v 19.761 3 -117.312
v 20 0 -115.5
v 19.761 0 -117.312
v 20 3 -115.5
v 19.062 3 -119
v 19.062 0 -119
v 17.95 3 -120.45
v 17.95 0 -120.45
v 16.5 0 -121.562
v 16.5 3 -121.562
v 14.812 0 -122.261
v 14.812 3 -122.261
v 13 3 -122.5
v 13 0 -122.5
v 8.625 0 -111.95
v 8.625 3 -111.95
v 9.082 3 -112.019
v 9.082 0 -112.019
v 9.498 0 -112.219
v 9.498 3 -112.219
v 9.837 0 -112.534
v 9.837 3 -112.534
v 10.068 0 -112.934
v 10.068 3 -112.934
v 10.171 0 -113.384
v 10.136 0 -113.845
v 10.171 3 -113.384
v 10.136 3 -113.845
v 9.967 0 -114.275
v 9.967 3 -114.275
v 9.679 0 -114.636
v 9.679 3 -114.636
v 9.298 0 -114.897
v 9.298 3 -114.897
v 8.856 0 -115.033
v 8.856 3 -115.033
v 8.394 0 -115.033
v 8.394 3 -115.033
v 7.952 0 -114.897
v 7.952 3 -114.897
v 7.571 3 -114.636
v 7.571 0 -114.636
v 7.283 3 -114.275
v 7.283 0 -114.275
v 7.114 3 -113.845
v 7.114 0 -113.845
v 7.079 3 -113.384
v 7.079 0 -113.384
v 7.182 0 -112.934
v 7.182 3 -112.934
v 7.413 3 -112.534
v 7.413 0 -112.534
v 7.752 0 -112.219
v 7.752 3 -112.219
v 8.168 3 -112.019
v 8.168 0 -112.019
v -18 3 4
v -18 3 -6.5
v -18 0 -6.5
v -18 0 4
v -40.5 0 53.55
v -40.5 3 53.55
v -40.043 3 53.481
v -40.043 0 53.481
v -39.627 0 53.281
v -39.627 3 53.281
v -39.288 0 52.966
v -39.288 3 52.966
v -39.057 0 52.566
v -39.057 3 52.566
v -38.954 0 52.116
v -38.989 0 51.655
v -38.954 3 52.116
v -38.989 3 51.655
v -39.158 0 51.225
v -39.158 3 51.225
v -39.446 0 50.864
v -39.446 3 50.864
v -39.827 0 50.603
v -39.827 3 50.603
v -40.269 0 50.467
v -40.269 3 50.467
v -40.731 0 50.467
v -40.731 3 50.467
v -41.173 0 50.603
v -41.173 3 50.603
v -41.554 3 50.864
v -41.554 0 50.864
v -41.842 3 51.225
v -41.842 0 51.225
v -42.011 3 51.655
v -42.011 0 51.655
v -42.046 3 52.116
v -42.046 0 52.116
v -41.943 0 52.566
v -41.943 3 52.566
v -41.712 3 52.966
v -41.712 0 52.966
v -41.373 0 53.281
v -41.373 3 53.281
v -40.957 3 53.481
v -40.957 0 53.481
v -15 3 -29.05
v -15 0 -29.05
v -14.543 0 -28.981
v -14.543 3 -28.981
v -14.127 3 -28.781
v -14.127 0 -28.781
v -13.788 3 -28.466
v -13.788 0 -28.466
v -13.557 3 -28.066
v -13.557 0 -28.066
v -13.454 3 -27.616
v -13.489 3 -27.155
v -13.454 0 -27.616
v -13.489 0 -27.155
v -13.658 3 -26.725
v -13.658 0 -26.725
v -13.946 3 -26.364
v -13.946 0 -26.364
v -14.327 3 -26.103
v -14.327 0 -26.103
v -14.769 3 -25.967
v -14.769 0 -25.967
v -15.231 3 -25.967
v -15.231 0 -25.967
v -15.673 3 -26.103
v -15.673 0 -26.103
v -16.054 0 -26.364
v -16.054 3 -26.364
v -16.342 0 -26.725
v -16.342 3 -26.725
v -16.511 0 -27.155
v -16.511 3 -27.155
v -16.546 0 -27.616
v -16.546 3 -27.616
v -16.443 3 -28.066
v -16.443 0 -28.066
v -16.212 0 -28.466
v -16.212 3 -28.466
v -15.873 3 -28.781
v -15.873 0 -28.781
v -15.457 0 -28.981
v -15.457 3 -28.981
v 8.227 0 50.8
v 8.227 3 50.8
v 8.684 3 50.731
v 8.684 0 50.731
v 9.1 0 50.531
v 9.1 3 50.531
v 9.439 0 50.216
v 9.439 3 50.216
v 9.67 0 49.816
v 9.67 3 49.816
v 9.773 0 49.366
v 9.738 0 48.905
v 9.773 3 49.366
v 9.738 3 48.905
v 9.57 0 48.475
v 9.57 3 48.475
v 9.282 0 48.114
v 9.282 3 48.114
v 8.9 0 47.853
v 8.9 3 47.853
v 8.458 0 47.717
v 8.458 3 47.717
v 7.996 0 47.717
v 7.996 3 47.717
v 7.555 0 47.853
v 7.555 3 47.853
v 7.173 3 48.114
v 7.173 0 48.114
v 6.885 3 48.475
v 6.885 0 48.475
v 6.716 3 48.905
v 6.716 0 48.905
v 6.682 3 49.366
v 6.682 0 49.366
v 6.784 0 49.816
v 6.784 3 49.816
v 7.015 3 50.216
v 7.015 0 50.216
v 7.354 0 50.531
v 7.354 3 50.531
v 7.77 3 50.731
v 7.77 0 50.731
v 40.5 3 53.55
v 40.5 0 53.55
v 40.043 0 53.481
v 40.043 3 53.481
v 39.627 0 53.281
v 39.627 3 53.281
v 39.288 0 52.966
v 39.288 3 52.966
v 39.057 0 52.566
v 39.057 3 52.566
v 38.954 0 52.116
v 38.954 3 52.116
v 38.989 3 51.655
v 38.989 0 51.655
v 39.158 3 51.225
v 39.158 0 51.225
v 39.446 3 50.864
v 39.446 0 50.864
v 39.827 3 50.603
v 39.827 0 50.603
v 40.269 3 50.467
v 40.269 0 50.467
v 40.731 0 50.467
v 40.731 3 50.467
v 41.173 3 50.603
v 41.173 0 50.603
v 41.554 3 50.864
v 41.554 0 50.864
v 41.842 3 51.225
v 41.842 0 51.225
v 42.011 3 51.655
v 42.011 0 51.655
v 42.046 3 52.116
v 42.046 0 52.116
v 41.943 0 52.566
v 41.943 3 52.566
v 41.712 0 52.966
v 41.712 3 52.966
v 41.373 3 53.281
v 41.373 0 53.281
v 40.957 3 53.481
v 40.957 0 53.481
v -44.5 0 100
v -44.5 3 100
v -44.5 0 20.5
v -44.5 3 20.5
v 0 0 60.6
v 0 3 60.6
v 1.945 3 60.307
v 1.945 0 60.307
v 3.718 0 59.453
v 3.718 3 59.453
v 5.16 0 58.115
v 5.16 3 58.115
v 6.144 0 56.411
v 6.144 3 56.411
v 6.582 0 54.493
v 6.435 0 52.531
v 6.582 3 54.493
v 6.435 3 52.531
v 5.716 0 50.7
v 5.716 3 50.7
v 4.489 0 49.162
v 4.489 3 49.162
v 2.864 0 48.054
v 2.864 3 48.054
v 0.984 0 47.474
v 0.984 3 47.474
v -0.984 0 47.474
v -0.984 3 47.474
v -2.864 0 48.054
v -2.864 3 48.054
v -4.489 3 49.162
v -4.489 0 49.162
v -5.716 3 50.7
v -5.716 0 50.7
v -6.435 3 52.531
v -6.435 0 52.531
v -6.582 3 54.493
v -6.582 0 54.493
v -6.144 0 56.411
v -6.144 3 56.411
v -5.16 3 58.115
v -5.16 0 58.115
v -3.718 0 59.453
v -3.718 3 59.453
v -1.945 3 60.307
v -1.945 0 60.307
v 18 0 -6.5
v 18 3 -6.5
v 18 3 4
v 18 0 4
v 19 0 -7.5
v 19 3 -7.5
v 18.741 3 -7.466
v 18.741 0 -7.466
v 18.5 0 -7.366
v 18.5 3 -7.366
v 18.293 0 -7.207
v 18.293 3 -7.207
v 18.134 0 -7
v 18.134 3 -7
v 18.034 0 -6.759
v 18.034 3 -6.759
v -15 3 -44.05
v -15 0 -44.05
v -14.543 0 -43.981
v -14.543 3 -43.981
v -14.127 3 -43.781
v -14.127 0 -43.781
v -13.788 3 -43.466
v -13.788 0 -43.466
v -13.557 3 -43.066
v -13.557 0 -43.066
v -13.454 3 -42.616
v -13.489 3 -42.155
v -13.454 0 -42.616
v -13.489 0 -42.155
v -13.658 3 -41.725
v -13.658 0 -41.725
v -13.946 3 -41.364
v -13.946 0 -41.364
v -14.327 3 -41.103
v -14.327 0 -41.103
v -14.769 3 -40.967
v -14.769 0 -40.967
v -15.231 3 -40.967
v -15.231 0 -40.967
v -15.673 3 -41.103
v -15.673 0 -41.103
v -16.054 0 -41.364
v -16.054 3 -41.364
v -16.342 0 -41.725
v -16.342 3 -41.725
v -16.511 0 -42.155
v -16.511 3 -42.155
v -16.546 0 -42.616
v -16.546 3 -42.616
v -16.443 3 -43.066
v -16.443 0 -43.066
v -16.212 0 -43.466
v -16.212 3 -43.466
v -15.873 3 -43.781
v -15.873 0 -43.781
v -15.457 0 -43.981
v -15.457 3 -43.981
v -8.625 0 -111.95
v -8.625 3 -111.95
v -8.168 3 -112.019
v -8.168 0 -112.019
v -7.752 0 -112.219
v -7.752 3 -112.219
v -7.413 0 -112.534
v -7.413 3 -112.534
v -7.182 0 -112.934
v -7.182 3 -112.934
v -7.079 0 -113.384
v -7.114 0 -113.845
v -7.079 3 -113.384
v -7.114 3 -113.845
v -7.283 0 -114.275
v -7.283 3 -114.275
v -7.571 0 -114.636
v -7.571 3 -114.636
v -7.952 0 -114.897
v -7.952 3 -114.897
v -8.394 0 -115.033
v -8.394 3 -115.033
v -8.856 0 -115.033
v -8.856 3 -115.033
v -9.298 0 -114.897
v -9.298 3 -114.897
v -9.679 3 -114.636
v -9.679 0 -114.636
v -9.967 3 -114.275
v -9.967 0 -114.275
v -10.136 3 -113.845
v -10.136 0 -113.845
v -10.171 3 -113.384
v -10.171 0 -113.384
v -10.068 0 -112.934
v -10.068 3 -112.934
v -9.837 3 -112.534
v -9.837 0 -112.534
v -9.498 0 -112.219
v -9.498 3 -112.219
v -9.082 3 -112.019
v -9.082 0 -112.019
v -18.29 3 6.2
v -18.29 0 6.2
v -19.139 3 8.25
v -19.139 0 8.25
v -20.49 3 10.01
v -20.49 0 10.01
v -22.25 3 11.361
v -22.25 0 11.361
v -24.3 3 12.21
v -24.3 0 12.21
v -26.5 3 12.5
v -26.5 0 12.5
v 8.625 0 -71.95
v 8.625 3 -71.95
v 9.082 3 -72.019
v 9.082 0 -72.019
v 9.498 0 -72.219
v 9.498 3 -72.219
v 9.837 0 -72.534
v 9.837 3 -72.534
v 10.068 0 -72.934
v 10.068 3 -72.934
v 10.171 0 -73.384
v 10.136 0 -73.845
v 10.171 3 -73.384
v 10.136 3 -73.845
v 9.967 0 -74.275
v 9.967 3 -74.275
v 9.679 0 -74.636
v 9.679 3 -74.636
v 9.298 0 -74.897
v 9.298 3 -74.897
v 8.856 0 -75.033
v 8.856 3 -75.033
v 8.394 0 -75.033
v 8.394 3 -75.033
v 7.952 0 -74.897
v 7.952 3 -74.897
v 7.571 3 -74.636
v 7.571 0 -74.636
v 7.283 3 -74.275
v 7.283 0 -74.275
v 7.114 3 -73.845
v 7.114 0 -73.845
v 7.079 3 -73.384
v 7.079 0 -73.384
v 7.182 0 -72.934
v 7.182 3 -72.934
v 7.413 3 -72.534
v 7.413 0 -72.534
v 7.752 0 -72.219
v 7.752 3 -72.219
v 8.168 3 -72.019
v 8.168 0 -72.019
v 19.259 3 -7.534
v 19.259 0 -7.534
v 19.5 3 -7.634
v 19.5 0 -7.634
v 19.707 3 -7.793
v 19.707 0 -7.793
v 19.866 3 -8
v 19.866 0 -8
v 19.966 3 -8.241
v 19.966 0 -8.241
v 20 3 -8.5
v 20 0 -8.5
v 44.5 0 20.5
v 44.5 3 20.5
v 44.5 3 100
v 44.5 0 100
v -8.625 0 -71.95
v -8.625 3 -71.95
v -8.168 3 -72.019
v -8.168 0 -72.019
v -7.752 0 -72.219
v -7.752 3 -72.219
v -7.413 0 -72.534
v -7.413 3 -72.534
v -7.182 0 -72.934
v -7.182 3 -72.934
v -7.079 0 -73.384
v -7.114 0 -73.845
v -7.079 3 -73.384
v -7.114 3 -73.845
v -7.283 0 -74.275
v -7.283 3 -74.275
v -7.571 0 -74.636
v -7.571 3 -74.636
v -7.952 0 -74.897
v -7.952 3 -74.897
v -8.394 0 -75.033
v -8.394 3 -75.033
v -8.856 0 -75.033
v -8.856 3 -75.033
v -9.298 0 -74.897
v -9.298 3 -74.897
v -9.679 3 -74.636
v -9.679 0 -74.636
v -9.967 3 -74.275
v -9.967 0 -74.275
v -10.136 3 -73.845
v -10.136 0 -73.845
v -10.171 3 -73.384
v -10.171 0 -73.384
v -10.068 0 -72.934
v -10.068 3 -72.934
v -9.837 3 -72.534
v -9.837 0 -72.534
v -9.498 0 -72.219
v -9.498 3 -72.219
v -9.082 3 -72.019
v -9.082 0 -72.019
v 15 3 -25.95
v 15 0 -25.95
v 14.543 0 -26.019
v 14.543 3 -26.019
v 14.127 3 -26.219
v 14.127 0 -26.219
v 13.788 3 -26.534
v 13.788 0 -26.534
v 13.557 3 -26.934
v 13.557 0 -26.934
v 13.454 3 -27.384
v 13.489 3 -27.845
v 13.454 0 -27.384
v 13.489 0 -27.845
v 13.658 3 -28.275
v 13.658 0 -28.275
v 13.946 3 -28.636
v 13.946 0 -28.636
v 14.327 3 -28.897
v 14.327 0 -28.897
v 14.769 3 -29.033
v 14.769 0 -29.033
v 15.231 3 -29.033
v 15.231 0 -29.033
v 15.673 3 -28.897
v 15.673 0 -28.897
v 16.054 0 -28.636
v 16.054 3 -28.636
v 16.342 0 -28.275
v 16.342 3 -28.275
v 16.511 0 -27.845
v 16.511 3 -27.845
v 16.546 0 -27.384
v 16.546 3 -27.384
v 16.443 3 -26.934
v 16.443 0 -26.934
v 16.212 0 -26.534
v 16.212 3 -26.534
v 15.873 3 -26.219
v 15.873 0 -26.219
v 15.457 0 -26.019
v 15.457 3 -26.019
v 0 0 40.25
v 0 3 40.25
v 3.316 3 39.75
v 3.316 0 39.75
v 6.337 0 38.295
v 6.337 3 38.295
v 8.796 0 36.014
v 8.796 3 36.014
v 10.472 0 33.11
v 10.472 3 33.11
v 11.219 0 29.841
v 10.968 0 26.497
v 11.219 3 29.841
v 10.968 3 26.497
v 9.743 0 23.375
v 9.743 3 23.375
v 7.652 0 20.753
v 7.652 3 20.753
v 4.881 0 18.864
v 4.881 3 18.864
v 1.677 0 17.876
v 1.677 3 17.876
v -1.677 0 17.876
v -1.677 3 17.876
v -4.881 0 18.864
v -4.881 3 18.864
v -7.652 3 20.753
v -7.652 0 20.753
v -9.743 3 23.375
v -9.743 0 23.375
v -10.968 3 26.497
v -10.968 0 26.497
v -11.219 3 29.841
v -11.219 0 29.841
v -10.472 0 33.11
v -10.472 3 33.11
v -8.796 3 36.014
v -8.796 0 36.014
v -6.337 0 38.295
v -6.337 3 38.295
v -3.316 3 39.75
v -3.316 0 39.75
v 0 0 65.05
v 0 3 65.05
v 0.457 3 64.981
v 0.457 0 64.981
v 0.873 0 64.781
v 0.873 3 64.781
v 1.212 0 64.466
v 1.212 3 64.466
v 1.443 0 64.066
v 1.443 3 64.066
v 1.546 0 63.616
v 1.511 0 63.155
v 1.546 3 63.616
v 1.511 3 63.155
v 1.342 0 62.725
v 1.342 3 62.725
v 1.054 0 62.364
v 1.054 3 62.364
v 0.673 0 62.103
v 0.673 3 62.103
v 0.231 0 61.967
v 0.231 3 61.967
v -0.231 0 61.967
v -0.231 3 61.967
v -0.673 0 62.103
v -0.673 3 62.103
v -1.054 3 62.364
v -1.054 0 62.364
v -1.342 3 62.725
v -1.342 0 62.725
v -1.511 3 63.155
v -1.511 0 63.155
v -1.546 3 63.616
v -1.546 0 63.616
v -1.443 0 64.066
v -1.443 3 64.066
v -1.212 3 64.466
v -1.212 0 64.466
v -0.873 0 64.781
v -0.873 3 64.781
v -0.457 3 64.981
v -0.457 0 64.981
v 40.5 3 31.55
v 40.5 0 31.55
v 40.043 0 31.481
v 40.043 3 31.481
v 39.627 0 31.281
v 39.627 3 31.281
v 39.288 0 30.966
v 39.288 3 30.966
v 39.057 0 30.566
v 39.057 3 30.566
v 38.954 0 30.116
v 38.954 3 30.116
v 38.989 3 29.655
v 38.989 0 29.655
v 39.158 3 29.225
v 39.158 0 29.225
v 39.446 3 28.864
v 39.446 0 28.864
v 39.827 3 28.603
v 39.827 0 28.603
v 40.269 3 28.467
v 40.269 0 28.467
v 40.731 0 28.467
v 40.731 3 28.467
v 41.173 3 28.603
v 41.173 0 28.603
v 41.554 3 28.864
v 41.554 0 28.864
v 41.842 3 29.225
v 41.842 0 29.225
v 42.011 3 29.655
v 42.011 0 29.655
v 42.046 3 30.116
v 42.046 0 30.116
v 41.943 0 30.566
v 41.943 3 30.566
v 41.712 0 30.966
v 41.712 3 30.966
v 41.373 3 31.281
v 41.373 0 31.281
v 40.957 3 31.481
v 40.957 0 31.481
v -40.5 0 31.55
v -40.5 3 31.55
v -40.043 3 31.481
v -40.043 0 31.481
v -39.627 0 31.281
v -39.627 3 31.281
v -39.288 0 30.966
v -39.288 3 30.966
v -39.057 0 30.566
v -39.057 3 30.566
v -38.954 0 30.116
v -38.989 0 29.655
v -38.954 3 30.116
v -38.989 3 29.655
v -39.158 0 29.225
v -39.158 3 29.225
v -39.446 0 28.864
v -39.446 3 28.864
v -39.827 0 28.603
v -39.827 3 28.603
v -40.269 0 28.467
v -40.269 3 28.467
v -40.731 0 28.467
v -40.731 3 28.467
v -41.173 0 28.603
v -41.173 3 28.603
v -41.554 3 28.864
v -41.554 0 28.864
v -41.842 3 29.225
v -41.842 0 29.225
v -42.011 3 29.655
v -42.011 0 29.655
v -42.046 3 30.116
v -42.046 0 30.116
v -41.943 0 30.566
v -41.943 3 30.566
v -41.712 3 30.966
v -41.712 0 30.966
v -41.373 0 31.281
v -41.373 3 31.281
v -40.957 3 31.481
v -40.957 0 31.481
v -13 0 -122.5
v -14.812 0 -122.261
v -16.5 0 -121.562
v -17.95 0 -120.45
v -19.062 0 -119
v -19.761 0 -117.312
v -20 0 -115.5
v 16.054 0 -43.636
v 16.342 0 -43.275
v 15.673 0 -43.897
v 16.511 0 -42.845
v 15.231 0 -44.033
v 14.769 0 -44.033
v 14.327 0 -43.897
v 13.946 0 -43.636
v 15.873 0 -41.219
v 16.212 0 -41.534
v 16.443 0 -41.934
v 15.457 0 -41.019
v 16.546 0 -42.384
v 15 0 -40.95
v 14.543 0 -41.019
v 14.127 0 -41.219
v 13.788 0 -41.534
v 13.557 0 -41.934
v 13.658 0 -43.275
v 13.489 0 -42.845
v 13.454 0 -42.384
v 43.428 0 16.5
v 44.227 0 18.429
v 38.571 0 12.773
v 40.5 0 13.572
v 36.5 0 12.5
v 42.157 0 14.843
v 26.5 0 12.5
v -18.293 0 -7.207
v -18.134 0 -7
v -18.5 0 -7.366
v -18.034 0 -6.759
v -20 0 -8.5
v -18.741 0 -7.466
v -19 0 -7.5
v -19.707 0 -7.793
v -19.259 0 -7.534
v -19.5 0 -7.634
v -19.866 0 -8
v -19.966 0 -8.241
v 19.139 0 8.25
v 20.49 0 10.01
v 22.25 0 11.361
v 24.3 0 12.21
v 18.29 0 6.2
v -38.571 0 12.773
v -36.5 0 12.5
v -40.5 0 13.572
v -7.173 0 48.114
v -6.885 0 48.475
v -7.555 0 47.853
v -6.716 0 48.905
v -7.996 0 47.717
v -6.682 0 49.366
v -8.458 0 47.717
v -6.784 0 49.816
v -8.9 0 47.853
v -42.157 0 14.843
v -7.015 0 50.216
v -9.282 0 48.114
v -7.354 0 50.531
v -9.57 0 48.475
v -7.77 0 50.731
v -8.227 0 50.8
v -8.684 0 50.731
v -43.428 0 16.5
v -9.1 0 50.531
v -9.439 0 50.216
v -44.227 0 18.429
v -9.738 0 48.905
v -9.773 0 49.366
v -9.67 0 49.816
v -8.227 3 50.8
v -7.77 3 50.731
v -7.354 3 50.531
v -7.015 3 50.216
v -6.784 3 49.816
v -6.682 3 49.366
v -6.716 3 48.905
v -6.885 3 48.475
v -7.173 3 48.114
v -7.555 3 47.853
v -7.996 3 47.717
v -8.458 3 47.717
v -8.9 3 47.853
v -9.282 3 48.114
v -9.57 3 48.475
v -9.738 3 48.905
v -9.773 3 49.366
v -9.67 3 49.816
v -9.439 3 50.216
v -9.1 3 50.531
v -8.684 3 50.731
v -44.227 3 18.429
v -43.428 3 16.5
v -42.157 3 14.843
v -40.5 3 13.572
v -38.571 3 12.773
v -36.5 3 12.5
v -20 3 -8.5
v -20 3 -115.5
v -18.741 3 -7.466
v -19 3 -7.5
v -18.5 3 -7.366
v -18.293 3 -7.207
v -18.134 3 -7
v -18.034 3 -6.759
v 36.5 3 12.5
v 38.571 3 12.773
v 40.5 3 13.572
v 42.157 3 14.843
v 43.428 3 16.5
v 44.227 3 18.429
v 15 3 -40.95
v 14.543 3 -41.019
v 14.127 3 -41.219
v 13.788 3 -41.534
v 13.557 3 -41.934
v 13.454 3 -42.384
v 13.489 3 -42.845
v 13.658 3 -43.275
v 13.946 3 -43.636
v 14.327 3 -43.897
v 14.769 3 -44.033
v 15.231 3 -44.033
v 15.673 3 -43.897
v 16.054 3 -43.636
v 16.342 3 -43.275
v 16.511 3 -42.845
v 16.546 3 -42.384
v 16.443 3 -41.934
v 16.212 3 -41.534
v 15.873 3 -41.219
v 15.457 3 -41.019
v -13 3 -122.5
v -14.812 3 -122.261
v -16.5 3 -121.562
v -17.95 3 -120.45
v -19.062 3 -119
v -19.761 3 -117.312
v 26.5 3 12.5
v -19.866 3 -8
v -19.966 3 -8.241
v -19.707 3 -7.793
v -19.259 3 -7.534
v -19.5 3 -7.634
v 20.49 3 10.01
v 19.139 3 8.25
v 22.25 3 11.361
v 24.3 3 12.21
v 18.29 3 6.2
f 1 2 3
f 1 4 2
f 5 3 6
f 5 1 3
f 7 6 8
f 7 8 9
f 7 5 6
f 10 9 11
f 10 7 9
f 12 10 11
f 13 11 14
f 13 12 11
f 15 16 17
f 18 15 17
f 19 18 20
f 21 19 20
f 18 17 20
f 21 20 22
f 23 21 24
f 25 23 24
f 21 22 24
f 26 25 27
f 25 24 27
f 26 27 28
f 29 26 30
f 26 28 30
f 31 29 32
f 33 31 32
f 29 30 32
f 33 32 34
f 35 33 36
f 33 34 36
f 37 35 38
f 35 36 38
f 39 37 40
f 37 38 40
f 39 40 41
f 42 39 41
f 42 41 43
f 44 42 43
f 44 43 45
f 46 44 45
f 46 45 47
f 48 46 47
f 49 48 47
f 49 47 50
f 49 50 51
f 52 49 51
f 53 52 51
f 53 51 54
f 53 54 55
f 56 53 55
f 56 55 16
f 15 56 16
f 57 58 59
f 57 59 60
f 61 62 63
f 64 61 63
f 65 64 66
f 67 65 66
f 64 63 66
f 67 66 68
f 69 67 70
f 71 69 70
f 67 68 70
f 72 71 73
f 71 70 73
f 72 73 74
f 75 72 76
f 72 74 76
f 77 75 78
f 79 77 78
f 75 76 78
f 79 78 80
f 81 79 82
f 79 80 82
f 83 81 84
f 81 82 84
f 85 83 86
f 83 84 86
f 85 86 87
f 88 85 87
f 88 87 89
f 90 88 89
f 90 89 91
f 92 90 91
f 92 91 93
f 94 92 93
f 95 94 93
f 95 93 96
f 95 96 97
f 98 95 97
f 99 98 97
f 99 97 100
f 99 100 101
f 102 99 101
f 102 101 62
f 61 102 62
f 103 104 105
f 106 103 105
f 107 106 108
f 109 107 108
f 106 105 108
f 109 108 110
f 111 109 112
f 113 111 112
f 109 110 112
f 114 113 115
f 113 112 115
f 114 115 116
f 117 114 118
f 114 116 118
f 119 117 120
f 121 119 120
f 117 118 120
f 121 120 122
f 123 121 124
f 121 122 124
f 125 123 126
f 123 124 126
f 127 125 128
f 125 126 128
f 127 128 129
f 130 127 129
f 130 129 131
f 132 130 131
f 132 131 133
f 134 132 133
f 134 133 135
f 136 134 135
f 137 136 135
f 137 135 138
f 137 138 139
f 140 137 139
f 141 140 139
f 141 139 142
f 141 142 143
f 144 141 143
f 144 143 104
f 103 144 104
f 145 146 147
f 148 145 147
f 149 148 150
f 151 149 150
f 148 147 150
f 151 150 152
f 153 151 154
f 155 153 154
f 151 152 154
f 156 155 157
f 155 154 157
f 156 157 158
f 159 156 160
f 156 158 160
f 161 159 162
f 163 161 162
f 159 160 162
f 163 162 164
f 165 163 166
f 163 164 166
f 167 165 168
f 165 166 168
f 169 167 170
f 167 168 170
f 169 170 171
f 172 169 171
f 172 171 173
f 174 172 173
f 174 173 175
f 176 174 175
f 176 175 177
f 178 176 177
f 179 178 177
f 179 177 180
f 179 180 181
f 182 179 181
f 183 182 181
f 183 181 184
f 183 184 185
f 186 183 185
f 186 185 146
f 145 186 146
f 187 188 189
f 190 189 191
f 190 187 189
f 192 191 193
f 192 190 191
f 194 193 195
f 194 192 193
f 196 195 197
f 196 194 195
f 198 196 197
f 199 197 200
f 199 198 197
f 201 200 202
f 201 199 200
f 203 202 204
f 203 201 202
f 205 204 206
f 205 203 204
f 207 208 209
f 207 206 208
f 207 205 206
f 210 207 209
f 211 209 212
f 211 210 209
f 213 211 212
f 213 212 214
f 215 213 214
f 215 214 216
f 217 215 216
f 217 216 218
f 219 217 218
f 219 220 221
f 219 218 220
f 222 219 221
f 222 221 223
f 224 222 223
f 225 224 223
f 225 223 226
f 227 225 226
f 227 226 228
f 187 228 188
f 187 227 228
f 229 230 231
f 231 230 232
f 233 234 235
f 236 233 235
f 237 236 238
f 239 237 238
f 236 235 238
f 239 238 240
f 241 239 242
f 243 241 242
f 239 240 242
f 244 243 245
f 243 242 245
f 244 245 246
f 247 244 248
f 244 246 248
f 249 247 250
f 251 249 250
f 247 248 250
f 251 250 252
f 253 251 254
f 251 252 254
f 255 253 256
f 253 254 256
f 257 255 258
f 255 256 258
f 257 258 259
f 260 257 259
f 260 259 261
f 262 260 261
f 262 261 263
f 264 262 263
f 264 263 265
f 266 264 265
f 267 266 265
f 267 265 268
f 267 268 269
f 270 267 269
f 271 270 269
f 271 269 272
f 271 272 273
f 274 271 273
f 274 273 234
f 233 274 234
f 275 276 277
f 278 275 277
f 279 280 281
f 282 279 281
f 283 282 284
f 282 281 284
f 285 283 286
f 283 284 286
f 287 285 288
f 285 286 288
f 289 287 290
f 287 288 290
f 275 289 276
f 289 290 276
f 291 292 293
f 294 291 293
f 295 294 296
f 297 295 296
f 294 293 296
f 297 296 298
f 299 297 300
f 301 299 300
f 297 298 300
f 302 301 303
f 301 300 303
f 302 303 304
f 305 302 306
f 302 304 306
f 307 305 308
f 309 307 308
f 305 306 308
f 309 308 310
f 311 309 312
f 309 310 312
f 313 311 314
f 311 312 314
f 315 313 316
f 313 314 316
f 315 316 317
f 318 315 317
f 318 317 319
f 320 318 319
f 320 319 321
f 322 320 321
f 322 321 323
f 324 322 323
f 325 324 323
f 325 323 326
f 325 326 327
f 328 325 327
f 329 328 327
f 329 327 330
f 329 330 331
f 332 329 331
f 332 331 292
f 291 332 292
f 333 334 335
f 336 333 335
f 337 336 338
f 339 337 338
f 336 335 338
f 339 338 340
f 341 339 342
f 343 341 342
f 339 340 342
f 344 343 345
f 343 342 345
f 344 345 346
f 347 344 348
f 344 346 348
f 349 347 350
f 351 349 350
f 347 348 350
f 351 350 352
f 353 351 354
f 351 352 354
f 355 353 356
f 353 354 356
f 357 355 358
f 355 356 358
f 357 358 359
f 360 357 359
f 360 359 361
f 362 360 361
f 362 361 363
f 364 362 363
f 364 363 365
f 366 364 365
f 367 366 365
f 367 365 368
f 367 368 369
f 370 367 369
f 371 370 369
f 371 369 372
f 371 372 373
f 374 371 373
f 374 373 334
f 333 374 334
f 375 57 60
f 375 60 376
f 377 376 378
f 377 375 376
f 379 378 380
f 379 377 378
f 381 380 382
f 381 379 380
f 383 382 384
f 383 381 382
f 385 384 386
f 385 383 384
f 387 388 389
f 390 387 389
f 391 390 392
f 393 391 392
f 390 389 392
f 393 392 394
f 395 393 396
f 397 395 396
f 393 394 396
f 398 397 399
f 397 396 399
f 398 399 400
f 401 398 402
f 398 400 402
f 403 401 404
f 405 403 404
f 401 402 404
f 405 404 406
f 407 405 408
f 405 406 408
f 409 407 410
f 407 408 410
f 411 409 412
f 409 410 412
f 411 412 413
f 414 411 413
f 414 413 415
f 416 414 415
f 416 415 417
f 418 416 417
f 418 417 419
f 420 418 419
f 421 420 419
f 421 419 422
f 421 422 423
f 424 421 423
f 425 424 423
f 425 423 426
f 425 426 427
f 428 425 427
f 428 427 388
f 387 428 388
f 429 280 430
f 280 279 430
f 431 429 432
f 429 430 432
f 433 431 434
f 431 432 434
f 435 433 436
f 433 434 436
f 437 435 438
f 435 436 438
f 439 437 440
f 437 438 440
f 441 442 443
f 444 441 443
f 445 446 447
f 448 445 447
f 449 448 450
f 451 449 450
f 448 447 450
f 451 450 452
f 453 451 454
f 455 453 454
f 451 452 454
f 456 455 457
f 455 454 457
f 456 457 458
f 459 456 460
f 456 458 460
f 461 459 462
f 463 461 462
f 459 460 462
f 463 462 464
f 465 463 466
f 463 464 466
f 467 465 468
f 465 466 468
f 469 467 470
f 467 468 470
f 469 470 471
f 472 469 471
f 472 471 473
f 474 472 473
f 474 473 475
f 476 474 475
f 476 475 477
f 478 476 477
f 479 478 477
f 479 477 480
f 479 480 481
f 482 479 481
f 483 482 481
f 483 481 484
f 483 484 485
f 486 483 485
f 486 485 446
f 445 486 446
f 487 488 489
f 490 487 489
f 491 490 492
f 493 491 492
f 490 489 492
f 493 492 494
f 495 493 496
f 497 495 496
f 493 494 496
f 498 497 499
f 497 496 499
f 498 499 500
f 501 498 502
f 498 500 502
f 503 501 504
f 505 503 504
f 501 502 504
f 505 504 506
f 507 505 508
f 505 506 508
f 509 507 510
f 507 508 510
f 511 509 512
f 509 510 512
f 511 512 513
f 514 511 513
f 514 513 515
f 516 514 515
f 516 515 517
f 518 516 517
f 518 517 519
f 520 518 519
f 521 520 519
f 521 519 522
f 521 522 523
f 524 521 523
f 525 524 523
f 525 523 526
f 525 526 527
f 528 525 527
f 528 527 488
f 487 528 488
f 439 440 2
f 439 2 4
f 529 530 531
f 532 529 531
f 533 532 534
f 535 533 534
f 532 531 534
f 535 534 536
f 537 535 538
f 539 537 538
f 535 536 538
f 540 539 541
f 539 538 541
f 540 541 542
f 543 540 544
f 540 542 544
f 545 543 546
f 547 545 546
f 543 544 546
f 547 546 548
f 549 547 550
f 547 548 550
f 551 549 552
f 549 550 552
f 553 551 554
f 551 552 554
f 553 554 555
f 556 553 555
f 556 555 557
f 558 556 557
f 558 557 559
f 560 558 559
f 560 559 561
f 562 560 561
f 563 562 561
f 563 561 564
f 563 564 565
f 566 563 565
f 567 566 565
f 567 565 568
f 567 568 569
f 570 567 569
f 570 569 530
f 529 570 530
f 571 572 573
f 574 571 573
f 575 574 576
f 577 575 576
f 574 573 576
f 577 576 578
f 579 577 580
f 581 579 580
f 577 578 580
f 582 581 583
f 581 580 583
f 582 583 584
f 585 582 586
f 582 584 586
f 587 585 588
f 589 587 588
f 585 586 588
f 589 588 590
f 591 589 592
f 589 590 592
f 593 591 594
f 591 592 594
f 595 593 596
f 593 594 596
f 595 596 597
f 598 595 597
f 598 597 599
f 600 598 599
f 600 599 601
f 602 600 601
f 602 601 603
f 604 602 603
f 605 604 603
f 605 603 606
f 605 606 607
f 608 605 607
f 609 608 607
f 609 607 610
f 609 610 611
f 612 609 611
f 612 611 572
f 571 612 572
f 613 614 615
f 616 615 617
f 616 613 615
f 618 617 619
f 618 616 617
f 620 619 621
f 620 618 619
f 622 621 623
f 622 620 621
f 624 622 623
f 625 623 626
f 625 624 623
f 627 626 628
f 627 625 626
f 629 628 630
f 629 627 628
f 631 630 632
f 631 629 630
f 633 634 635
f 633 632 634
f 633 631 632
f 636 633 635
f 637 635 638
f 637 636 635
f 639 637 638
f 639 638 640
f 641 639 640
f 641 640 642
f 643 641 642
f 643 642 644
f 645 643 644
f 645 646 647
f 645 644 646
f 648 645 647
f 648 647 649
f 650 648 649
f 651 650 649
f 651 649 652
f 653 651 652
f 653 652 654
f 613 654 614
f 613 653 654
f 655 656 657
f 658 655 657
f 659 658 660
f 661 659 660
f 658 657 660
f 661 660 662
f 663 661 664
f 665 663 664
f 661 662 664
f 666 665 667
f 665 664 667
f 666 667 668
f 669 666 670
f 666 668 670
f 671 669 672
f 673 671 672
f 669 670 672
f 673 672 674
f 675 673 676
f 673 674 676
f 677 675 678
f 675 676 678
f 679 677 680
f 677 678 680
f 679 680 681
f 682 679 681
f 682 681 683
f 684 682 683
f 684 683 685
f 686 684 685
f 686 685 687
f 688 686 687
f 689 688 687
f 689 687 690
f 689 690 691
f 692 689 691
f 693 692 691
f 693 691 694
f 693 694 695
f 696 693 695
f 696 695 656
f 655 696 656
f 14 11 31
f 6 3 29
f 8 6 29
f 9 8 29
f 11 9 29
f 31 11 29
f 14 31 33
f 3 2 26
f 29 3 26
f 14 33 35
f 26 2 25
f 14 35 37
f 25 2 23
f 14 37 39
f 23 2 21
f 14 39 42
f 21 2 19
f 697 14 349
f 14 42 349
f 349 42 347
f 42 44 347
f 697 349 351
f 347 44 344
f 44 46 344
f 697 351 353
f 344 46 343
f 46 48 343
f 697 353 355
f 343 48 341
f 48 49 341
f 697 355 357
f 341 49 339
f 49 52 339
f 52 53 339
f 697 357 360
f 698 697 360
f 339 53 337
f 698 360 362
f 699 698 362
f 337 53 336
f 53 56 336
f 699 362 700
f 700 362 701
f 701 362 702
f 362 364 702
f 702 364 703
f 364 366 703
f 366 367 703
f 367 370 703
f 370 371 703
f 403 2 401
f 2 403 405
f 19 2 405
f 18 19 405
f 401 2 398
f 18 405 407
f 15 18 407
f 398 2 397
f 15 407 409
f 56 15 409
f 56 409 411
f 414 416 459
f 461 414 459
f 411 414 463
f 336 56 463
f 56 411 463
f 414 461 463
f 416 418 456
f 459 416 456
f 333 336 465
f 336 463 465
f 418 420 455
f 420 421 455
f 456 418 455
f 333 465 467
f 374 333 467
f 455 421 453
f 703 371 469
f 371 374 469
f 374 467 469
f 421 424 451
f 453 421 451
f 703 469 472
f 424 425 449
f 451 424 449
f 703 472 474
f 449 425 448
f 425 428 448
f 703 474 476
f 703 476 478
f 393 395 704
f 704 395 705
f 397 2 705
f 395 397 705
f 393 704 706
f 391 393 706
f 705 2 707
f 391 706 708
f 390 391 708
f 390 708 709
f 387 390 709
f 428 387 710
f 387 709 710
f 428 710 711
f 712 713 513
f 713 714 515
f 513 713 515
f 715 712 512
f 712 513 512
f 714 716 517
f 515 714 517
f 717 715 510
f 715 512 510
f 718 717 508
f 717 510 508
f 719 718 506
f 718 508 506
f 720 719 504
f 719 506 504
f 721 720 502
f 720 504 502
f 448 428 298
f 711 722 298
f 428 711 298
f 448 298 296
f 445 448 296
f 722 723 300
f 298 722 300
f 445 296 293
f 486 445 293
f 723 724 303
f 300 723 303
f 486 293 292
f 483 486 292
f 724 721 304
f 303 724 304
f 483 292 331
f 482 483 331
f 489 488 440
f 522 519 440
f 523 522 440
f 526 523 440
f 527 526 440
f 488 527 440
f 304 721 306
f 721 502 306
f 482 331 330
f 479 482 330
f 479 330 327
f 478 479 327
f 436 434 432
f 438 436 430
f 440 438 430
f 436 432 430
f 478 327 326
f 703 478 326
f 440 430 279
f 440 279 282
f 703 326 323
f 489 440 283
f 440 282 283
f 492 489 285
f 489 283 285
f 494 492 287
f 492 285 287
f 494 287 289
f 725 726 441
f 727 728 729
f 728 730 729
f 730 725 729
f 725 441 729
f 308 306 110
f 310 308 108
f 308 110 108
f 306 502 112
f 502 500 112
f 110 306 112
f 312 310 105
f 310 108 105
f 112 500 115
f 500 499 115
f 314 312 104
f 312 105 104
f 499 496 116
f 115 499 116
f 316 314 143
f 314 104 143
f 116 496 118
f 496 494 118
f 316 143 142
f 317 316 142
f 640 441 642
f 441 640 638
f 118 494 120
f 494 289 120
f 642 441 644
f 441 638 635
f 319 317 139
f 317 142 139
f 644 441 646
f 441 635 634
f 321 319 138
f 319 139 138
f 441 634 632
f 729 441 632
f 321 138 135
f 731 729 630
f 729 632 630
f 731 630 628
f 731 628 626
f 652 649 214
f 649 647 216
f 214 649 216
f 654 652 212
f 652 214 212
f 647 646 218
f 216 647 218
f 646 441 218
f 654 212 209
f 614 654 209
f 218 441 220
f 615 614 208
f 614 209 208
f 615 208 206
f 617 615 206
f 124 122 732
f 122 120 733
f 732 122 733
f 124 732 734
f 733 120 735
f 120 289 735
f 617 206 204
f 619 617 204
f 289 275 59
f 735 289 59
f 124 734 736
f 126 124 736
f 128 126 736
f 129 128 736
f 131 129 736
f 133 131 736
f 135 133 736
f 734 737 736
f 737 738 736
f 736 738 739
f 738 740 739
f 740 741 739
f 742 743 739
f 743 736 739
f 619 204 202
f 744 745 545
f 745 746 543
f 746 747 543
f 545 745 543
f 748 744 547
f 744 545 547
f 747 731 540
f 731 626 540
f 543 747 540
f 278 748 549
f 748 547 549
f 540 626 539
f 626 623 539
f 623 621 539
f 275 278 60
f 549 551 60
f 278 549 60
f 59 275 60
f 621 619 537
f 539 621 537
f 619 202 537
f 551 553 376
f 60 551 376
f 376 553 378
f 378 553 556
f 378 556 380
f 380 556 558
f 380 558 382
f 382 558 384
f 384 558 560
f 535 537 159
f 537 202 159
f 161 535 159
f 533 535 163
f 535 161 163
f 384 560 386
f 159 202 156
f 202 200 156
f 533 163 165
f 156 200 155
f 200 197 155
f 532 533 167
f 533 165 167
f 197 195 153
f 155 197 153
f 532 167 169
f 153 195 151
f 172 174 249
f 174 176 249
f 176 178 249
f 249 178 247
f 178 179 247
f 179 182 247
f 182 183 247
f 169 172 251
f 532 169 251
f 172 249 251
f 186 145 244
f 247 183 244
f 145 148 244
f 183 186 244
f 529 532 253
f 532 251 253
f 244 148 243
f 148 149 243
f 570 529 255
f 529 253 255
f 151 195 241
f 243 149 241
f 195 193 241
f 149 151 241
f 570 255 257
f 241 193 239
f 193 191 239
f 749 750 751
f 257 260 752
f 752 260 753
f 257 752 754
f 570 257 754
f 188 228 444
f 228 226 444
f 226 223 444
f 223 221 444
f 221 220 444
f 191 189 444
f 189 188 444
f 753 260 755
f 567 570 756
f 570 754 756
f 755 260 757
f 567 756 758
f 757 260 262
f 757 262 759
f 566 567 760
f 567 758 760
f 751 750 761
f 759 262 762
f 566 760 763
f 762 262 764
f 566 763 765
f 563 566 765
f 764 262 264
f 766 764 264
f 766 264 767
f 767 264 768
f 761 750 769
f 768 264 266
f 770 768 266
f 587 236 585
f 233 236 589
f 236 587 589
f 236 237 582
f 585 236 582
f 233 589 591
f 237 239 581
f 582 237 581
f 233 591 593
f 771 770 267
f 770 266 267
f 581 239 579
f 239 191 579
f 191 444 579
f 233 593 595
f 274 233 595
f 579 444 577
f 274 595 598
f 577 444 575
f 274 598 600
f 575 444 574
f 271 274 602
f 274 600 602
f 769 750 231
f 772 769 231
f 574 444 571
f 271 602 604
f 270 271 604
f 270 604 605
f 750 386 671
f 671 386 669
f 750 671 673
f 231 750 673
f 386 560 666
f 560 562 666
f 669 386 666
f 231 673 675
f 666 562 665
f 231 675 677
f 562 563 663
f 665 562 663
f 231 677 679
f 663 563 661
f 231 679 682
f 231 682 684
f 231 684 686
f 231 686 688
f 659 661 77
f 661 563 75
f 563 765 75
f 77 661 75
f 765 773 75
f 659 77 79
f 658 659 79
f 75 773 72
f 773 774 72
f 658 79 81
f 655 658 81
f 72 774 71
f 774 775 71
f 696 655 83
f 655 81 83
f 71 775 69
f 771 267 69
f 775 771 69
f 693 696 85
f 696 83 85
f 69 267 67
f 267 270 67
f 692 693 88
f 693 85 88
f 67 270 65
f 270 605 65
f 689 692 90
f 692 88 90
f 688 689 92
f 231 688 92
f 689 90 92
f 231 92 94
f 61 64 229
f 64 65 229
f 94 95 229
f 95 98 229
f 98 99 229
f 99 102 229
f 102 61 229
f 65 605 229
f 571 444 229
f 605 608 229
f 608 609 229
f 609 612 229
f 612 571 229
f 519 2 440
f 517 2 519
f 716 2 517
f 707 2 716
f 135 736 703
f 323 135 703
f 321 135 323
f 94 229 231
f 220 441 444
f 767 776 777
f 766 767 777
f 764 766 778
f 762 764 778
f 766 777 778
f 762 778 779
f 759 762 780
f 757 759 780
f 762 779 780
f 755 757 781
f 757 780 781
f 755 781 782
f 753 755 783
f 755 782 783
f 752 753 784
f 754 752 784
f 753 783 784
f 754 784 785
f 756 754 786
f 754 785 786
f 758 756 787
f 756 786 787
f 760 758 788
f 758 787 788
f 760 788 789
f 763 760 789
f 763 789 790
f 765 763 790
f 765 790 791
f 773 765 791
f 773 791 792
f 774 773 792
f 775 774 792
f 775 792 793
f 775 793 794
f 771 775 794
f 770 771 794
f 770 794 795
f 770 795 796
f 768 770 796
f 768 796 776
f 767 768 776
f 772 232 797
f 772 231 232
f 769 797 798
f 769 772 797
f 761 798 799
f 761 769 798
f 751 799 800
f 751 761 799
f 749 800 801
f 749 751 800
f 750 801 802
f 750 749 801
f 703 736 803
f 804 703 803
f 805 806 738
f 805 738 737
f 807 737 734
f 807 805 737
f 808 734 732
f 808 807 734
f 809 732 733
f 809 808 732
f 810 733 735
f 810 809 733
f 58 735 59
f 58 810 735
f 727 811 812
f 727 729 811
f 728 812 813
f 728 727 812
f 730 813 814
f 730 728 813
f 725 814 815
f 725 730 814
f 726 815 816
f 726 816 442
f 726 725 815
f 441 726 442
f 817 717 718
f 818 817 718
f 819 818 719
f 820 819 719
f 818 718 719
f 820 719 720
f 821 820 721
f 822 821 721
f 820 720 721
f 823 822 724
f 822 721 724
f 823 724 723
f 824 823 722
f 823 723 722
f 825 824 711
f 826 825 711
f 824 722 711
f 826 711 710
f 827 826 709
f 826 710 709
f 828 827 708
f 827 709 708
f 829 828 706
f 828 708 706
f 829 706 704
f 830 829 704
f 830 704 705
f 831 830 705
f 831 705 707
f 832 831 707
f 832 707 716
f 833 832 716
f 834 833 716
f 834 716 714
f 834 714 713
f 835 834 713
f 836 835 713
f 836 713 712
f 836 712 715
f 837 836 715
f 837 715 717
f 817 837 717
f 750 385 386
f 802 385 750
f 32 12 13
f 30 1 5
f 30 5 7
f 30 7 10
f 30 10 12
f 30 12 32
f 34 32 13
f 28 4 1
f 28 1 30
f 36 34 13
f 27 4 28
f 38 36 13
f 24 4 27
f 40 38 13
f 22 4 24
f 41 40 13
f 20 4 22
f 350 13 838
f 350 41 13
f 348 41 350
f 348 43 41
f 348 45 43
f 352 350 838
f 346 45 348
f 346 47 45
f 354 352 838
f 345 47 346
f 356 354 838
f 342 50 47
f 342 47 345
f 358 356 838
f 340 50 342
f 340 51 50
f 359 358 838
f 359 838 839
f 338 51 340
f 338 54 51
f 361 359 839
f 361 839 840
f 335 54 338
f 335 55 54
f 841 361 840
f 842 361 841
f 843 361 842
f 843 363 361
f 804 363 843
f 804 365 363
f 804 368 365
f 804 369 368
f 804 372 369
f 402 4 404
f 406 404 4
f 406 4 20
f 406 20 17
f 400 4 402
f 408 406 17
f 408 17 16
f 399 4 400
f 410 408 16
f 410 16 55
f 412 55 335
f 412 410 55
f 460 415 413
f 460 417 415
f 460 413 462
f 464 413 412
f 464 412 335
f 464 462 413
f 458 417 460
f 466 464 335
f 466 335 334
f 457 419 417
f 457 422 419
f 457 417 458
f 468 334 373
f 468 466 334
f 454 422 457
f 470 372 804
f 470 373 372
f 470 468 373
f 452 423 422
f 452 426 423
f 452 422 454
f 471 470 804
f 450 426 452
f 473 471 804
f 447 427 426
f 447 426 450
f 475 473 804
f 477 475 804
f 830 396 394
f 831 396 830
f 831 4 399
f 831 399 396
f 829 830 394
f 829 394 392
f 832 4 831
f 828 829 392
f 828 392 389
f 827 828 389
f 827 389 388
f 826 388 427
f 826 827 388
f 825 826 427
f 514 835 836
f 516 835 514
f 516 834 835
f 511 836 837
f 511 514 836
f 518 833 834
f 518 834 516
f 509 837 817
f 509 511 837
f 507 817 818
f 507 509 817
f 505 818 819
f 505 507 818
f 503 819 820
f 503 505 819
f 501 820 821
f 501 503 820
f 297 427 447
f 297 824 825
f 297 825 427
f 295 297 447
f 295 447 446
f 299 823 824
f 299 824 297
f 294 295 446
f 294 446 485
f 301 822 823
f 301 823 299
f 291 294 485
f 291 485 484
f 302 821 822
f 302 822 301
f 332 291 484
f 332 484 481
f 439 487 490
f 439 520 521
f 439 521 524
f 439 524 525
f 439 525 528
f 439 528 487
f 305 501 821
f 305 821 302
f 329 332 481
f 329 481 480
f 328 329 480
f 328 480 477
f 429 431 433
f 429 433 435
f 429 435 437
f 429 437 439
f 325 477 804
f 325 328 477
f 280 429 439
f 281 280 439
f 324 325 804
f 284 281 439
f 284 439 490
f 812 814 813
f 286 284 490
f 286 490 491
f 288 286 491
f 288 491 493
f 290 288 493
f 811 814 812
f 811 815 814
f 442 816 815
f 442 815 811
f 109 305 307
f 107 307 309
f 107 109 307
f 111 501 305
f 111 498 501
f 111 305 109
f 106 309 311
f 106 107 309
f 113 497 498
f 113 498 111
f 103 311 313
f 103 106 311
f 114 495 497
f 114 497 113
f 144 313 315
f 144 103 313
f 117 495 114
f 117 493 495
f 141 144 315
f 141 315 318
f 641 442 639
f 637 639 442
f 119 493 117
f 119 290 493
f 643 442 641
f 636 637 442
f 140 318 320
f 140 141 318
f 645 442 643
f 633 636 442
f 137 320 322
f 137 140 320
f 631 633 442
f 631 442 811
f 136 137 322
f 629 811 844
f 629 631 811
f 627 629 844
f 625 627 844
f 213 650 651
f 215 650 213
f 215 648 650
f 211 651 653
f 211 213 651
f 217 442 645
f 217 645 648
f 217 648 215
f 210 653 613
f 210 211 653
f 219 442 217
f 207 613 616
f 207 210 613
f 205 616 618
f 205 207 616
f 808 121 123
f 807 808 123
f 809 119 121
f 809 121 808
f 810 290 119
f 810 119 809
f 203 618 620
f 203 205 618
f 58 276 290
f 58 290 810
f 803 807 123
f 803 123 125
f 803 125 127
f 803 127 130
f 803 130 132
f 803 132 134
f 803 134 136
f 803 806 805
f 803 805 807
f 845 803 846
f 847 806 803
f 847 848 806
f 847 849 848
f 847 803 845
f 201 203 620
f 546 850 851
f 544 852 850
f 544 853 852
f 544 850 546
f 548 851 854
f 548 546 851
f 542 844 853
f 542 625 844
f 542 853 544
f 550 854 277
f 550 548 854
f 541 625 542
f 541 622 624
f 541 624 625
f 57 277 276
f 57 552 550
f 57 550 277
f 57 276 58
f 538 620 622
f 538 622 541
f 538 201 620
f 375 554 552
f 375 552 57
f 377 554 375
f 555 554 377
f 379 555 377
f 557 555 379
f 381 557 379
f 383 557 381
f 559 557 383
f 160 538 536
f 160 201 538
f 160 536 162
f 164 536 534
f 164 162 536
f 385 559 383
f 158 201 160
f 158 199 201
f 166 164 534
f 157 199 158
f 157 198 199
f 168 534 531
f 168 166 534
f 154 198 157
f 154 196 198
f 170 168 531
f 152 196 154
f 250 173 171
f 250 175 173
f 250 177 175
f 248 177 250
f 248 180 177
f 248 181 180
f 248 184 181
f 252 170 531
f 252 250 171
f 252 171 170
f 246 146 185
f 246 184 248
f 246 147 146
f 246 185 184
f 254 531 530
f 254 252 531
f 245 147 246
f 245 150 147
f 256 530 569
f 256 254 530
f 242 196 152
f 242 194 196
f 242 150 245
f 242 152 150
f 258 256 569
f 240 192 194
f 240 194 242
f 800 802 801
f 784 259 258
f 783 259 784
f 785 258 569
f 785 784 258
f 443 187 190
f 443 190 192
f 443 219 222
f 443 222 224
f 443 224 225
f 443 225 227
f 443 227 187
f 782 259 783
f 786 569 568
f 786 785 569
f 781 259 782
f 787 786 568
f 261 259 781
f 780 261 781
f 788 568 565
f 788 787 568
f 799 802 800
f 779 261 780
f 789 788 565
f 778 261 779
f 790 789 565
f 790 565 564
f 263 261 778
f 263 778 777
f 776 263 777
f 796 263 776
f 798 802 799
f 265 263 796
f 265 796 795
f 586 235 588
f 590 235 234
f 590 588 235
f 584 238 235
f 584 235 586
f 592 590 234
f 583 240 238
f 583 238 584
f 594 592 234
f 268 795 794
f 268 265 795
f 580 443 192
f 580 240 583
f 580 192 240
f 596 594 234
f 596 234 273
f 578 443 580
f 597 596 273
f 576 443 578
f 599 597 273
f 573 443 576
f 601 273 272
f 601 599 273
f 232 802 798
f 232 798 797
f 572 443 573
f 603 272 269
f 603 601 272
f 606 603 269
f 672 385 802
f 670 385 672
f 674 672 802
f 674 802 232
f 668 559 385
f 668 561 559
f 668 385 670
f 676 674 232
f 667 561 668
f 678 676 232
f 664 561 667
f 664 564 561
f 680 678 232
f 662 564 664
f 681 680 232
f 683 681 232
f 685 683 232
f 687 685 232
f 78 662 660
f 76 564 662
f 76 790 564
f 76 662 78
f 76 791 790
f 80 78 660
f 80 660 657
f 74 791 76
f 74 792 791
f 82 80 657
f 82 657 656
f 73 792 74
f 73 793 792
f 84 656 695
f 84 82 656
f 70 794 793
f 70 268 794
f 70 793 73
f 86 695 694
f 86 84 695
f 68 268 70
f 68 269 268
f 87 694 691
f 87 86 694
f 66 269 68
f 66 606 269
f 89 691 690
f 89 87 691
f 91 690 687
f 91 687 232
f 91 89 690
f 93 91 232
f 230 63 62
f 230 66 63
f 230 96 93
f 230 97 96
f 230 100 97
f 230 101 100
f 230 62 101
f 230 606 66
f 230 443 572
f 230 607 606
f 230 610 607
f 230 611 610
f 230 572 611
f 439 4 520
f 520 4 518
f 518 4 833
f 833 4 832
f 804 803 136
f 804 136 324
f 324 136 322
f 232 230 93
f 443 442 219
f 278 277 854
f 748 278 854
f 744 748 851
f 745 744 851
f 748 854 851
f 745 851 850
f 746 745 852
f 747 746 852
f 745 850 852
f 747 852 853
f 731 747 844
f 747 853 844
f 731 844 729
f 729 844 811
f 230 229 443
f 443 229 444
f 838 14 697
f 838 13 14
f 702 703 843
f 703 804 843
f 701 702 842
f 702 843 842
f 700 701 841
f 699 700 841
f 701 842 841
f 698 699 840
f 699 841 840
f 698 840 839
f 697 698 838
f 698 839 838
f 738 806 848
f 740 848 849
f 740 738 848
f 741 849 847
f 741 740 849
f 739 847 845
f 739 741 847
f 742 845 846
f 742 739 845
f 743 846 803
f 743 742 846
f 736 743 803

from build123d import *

# Parameters (mm, degrees)
SKETCH_1_W              = 200
SKETCH_1_H              = 200
EXTRUDE_1_DEPTH         = 3
SKETCH_2_R              = 1.5
CUT_EXTRUDE_2_DEPTH     = 10
CUT_EXTRUDE_3_DEPTH     = 10
SKETCH_6_R              = 1.55
CUT_EXTRUDE_3_1_1_DEPTH = 10
CUT_EXTRUDE_6_REACH     = 111.495
SKETCH_11_R             = 1.5
CUT_EXTRUDE_20_5_REACH  = 111.495
SKETCH_4_R              = 11.25
FILLET_1_R              = 1
SKETCH_12_W             = 40
SKETCH_12_H             = 3
EXTRUDE_2_DEPTH         = 75
FILLET_2_R              = 7
SKETCH_13_R             = 1.55
CUT_EXTRUDE_3_1_3_DEPTH = 10
CUT_EXTRUDE_2006_REACH  = 132.367
SKETCH_14_R             = 1.55
SKETCH_14_R_2           = 6.6
FILLET_3_R              = 8
SKETCH_17_R             = 1.55
CUT_EXTRUDE_7_DEPTH     = 131.36679025


with BuildPart() as part:
    # 草图1 → 凸台-拉伸1 (new body)
    with BuildSketch(Plane(origin=(0, 0, 0), x_dir=(1, 0, 0), z_dir=(0, 1, 0))):
        Rectangle(SKETCH_1_W, SKETCH_1_H)
    extrude(amount=EXTRUDE_1_DEPTH)

    # 草图2 → 切除-拉伸2 (cut)
    with BuildSketch(Plane(origin=(0, 3, 0), x_dir=(1, 0, 0), z_dir=(0, 1, 0))):
        with Locations(Location((29.5, 9.5, 0), (0, 0, 270))):
            Circle(SKETCH_2_R)
        with Locations(Location((21.5, 0, 0), (0, 0, 270))):
            Circle(SKETCH_2_R)
        with Locations(Location((29.5, -9.5, 0), (0, 0, 270))):
            Circle(SKETCH_2_R)
        with Locations(Location((37.5, 0, 0), (0, 0, 270))):
            Circle(SKETCH_2_R)
        with Locations(Location((-29.5, -9.5, 0), (0, 0, 270))):
            Circle(SKETCH_2_R)
        with Locations(Location((-37.5, 0, 0), (0, 0, 270))):
            Circle(SKETCH_2_R)
        with Locations(Location((-21.5, 0, 0), (0, 0, 270))):
            Circle(SKETCH_2_R)
        with Locations(Location((-29.5, 9.5, 0), (0, 0, 270))):
            Circle(SKETCH_2_R)
    extrude(amount=-CUT_EXTRUDE_2_DEPTH, mode=Mode.SUBTRACT)

    # 草图5 → 切除-拉伸3 (cut)
    with BuildSketch(Plane(origin=(0, 3, 0), x_dir=(1, 0, 0), z_dir=(0, 1, 0))):
        with BuildLine():
            Line((-100, -100), (-44.5, -100))
            Line((-44.5, -100), (-44.5, 0))
            ThreePointArc((-44.5, 0), (-40.212142643, 10.5), (-29.8, 14.9969997))
            ThreePointArc((-29.8, 14.9969997), (-22.858571571, 17.9949995), (-20, 24.9949995))
            Line((-20, 24.9949995), (-20, 47.5))
            Line((-20, 47.5), (0, 47.5))
            Line((0, 47.5), (20, 47.5))
            Line((20, 47.5), (20, 24.9949995))
            ThreePointArc((20, 24.9949995), (22.858571571, 17.9949995), (29.8, 14.9969997))
            ThreePointArc((29.8, 14.9969997), (40.212142643, 10.5), (44.5, 0))
            Line((44.5, 0), (44.5, -100))
            Line((44.5, -100), (100, -100))
            Line((100, -100), (100, 100))
            Line((100, 100), (-100, 100))
            Line((-100, 100), (-100, -100))
        make_face()
    extrude(amount=-CUT_EXTRUDE_3_DEPTH, mode=Mode.SUBTRACT)

    # 草图6 → φ3.1通孔1 (cut)
    with BuildSketch(Plane.XZ):
        with Locations(Location((-15, -42.5, 0), (0, 0, 270))):
            Circle(SKETCH_6_R)
        with Locations(Location((-15, -27.5, 0), (0, 0, 270))):
            Circle(SKETCH_6_R)
        with Locations(Location((15, -27.5, 0), (0, 0, 90))):
            Circle(SKETCH_6_R)
        with Locations(Location((15, -42.5, 0), (0, 0, 90))):
            Circle(SKETCH_6_R)
    extrude(amount=-CUT_EXTRUDE_3_1_1_DEPTH, mode=Mode.SUBTRACT)

    # 草图11 → 切除-拉伸6 (cut, up to next)
    with BuildSketch(Plane(origin=(0, 3, 0), x_dir=(1, 0, 0), z_dir=(0, 1, 0)), mode=Mode.PRIVATE) as cut_extrude_6_sk1:
        with BuildLine():
            Line((44.5, -17.5), (44.5, -100))
            Line((44.5, -100), (101.133062566, -100))
            Line((101.133062566, -100), (101.133062566, 47.5))
            Line((101.133062566, 47.5), (20, 47.5))
            Line((20, 47.5), (20, 7.5))
            Line((20, 7.5), (19, 7.5))
            ThreePointArc((19, 7.5), (18.292893219, 7.207106781), (18, 6.5))
            Line((18, 6.5), (18, -4))
            ThreePointArc((18, -4), (20.48959236, -10.01040764), (26.5, -12.5))
            Line((26.5, -12.5), (39.5, -12.5))
            Line((39.5, -12.5), (44.5, -12.5))
            Line((44.5, -12.5), (44.5, -17.5))
        make_face()
        with Locations((29.5, -9.5)):
            Circle(SKETCH_11_R, mode=Mode.SUBTRACT)
        with Locations((21.5, 0)):
            Circle(SKETCH_11_R, mode=Mode.SUBTRACT)
    cut_extrude_6_tool1 = extrude(cut_extrude_6_sk1.sketch, amount=-CUT_EXTRUDE_6_REACH, mode=Mode.PRIVATE) & part.part
    # 草图11 → 切除-拉伸6 (cut, up to next)
    with BuildSketch(Plane(origin=(0, 3, 0), x_dir=(1, 0, 0), z_dir=(0, 1, 0)), mode=Mode.PRIVATE) as cut_extrude_6_sk2:
        with BuildLine():
            Line((-44.5, -17.5), (-44.5, -100))
            Line((-44.5, -100), (-101.133062566, -100))
            Line((-101.133062566, -100), (-101.133062566, 47.5))
            Line((-101.133062566, 47.5), (-20, 47.5))
            Line((-20, 47.5), (-20, 7.5))
            Line((-20, 7.5), (-19, 7.5))
            ThreePointArc((-19, 7.5), (-18.292893219, 7.207106781), (-18, 6.5))
            Line((-18, 6.5), (-18, -4))
            ThreePointArc((-18, -4), (-20.48959236, -10.01040764), (-26.5, -12.5))
            Line((-26.5, -12.5), (-39.5, -12.5))
            Line((-39.5, -12.5), (-44.5, -12.5))
            Line((-44.5, -12.5), (-44.5, -17.5))
        make_face()
    cut_extrude_6_tool2 = extrude(cut_extrude_6_sk2.sketch, amount=-CUT_EXTRUDE_6_REACH, mode=Mode.PRIVATE) & part.part
    add(cut_extrude_6_tool1.solids().sort_by_distance((66.686037, 3, 19.669577))[0], mode=Mode.SUBTRACT)
    add(cut_extrude_6_tool2.solids().sort_by_distance((-66.626911, 3, 19.648158))[0], mode=Mode.SUBTRACT)

    # 草图4 → φ20.5落弹孔 (cut, up to next)
    with BuildSketch(Plane(origin=(0, 3, 0), x_dir=(1, 0, 0), z_dir=(0, 1, 0)), mode=Mode.PRIVATE) as cut_extrude_20_5_sk1:
        with Locations(Location((0, -29, 0), (0, 0, 270))):
            Circle(SKETCH_4_R)
    cut_extrude_20_5_tool1 = extrude(cut_extrude_20_5_sk1.sketch, amount=-CUT_EXTRUDE_20_5_REACH, mode=Mode.PRIVATE) & part.part
    add(cut_extrude_20_5_tool1.solids().sort_by_distance((0, 3, 29))[0], mode=Mode.SUBTRACT)

    # 圆角1
    fillet_1_edges = [part.edges().sort_by_distance(p)[0] for p in [
        (-20, 1.5, -7.5),
        (20, 1.5, -7.5),
    ]]
    fillet(fillet_1_edges, radius=FILLET_1_R - 0.0001)  # a hair under: the kernel refuses the full size

    # 草图12 → 凸台-拉伸2 (add)
    with BuildSketch(Plane(origin=(0, 0, -47.5), x_dir=(-1, 0, 0), z_dir=(0, 0, -1))):
        with Locations((0, 1.5)):
            Rectangle(SKETCH_12_W, SKETCH_12_H)
    extrude(amount=EXTRUDE_2_DEPTH)

    # 圆角2
    fillet_2_edges = [part.edges().sort_by_distance(p)[0] for p in [
        (20, 1.5, -122.5),
        (-20, 1.5, -122.5),
    ]]
    fillet(fillet_2_edges, radius=FILLET_2_R)

    # 草图13 → φ3.1通孔3 (cut)
    with BuildSketch(Plane(origin=(0, 3, 0), x_dir=(1, 0, 0), z_dir=(0, 1, 0))):
        with Locations(Location((-8.625, 113.5, 0), (0, 0, 270))):
            Circle(SKETCH_13_R)
        with Locations(Location((8.625, 113.5, 0), (0, 0, 270))):
            Circle(SKETCH_13_R)
        with Locations(Location((8.625, 73.5, 0), (0, 0, 270))):
            Circle(SKETCH_13_R)
        with Locations(Location((-8.625, 73.5, 0), (0, 0, 270))):
            Circle(SKETCH_13_R)
    extrude(amount=-CUT_EXTRUDE_3_1_3_DEPTH, mode=Mode.SUBTRACT)

    # 草图14 → 2006电机固定 (cut, up to next)
    with BuildSketch(Plane(origin=(0, 3, 0), x_dir=(1, 0, 0), z_dir=(0, 1, 0)), mode=Mode.PRIVATE) as cut_extrude_2006_sk1:
        with Locations(Location((0, -63.5, 0), (0, 0, 270))):
            Circle(SKETCH_14_R)
    cut_extrude_2006_tool1 = extrude(cut_extrude_2006_sk1.sketch, amount=-CUT_EXTRUDE_2006_REACH, mode=Mode.PRIVATE) & part.part
    # 草图14 → 2006电机固定 (cut, up to next)
    with BuildSketch(Plane(origin=(0, 3, 0), x_dir=(1, 0, 0), z_dir=(0, 1, 0)), mode=Mode.PRIVATE) as cut_extrude_2006_sk2:
        with Locations(Location((-8.227241336, -49.25, 0), (0, 0, 270))):
            Circle(SKETCH_14_R)
    cut_extrude_2006_tool2 = extrude(cut_extrude_2006_sk2.sketch, amount=-CUT_EXTRUDE_2006_REACH, mode=Mode.PRIVATE) & part.part
    # 草图14 → 2006电机固定 (cut, up to next)
    with BuildSketch(Plane(origin=(0, 3, 0), x_dir=(1, 0, 0), z_dir=(0, 1, 0)), mode=Mode.PRIVATE) as cut_extrude_2006_sk3:
        with Locations(Location((8.227241336, -49.25, 0), (0, 0, 270))):
            Circle(SKETCH_14_R)
    cut_extrude_2006_tool3 = extrude(cut_extrude_2006_sk3.sketch, amount=-CUT_EXTRUDE_2006_REACH, mode=Mode.PRIVATE) & part.part
    # 草图14 → 2006电机固定 (cut, up to next)
    with BuildSketch(Plane(origin=(0, 3, 0), x_dir=(1, 0, 0), z_dir=(0, 1, 0)), mode=Mode.PRIVATE) as cut_extrude_2006_sk4:
        with Locations(Location((0, -54, 0), (0, 0, 270))):
            Circle(SKETCH_14_R_2)
    cut_extrude_2006_tool4 = extrude(cut_extrude_2006_sk4.sketch, amount=-CUT_EXTRUDE_2006_REACH, mode=Mode.PRIVATE) & part.part
    add(cut_extrude_2006_tool1.solids().sort_by_distance((0, 3, 63.5))[0], mode=Mode.SUBTRACT)
    add(cut_extrude_2006_tool2.solids().sort_by_distance((-8.227241, 3, 49.25))[0], mode=Mode.SUBTRACT)
    add(cut_extrude_2006_tool3.solids().sort_by_distance((8.227241, 3, 49.25))[0], mode=Mode.SUBTRACT)
    add(cut_extrude_2006_tool4.solids().sort_by_distance((0, 3, 54))[0], mode=Mode.SUBTRACT)

    # 圆角3
    fillet_3_edges = [part.edges().sort_by_distance(p)[0] for p in [
        (44.5, 1.5, 12.5),
        (-44.5, 1.5, 12.5),
    ]]
    fillet(fillet_3_edges, radius=FILLET_3_R)

    # 草图17 → 切除-拉伸7 (cut, through all)
    with BuildSketch(Plane(origin=(0, 3, 0), x_dir=(1, 0, 0), z_dir=(0, 1, 0))):
        with Locations(Location((-40.5, -30, 0), (0, 0, 270))):
            Circle(SKETCH_17_R)
        with Locations(Location((-40.5, -52, 0), (0, 0, 270))):
            Circle(SKETCH_17_R)
    cut_extrude_7 = extrude(amount=-CUT_EXTRUDE_7_DEPTH, mode=Mode.SUBTRACT)

    # 镜向1: 切除-拉伸7 across plane
    add(cut_extrude_7.mirror(Plane(origin=(0, 0, 0), x_dir=(0, 0, 1), z_dir=(1, 0, 0))), mode=Mode.SUBTRACT)


solid = part.part
